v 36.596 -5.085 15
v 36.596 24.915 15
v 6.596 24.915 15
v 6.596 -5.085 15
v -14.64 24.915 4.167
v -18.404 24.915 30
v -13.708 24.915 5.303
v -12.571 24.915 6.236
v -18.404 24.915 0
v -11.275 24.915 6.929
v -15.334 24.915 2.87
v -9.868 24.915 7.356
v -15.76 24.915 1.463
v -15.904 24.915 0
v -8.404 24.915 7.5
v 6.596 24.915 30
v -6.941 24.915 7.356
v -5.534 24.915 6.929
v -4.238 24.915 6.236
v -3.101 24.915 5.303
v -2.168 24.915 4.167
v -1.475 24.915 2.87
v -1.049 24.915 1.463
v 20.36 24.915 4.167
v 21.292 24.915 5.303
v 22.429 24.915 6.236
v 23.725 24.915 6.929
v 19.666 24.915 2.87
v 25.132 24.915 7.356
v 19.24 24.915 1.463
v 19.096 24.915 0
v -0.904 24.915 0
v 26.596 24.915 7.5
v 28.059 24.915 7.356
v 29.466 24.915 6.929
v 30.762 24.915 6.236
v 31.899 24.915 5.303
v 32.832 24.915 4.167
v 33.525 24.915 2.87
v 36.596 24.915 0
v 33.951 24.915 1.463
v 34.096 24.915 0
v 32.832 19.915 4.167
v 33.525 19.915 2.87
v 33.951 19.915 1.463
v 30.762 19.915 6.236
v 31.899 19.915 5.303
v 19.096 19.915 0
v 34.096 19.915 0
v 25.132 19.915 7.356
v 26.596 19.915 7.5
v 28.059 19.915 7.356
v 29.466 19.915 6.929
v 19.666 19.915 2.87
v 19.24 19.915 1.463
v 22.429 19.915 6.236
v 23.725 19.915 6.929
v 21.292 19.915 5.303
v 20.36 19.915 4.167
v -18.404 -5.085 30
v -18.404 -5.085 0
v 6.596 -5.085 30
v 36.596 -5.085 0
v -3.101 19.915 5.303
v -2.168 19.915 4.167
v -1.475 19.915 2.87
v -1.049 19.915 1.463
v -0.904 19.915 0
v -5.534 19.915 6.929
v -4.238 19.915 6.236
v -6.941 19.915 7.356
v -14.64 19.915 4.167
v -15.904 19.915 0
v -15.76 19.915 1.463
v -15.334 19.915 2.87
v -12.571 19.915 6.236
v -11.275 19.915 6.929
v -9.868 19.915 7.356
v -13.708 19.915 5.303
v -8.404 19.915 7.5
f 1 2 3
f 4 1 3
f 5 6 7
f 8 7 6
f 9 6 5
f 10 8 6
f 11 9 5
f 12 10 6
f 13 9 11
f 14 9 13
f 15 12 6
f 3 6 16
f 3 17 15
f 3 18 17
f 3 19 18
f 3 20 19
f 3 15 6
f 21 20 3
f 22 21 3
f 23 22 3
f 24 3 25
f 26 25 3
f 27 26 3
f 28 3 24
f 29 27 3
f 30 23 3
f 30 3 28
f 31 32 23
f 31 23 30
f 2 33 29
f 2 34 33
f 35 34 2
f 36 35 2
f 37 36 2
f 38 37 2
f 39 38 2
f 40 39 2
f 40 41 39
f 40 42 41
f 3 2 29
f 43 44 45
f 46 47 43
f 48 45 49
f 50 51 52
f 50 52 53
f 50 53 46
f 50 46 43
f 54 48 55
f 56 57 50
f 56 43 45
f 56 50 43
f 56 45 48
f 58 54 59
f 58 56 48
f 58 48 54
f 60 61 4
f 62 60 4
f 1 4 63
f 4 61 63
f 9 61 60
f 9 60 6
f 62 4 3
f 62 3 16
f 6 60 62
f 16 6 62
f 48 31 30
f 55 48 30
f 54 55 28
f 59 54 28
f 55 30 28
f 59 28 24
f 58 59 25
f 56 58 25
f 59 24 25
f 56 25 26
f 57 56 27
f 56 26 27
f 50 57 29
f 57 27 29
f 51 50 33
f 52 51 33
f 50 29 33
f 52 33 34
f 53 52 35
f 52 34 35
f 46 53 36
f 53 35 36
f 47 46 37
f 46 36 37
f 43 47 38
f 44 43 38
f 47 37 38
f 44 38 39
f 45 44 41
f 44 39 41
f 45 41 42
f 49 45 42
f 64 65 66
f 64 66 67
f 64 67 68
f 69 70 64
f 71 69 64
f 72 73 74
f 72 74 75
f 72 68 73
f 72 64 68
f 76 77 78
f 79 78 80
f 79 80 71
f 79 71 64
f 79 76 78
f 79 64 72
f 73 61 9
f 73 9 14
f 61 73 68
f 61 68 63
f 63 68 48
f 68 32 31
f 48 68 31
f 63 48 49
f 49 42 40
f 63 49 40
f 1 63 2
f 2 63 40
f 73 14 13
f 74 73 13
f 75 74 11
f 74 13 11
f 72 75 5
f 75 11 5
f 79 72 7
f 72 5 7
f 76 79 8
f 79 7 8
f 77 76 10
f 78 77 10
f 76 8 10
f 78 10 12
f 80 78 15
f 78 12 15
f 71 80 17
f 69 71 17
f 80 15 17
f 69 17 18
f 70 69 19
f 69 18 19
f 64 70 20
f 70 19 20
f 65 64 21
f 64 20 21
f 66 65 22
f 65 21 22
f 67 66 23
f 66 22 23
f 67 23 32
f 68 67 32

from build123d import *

# Parameters (mm, degrees)
F0_W     = 55
F0_H     = 30
F1_DEPTH = 30
F2_W     = 30
F2_H     = 15
F3_DEPTH = 30.001
F5_DEPTH = 5


with BuildPart() as f1:
    # F0 (on Top) → F1 (new body)
    with BuildSketch(Plane.XY):
        with Locations((9.0955648875, 9.9145695567)):
            Rectangle(F0_W, F0_H)
    extrude(amount=F1_DEPTH)

    # F2 (on face) → F3 (cut, through all)
    with BuildSketch(Plane(origin=(0, 24.9145695567, 0), x_dir=(-1, 0, 0), z_dir=(0, 1, 0))):
        with Locations((-21.5955648875, 22.5)):
            Rectangle(F2_W, F2_H)
    extrude(amount=-F3_DEPTH, mode=Mode.SUBTRACT)

    # F4 (on face) → F5 (cut)
    with BuildSketch(Plane(origin=(0, 24.9145695567, 0), x_dir=(-1, 0, 0), z_dir=(0, 1, 0))):
        with BuildLine():
            Line((-34.0955648875, 0), (-19.0955648875, 0))
            ThreePointArc((-19.0955648875, 0), (-26.5955648875, 7.5), (-34.0955648875, 0))
        make_face()
        with BuildLine():
            ThreePointArc((15.9044351125, 0), (8.4044351125, 7.5), (0.9044351125, 0))
            Line((0.9044351125, 0), (15.9044351125, 0))
        make_face()
    extrude(amount=-F5_DEPTH, mode=Mode.SUBTRACT)


solid = f1.part
